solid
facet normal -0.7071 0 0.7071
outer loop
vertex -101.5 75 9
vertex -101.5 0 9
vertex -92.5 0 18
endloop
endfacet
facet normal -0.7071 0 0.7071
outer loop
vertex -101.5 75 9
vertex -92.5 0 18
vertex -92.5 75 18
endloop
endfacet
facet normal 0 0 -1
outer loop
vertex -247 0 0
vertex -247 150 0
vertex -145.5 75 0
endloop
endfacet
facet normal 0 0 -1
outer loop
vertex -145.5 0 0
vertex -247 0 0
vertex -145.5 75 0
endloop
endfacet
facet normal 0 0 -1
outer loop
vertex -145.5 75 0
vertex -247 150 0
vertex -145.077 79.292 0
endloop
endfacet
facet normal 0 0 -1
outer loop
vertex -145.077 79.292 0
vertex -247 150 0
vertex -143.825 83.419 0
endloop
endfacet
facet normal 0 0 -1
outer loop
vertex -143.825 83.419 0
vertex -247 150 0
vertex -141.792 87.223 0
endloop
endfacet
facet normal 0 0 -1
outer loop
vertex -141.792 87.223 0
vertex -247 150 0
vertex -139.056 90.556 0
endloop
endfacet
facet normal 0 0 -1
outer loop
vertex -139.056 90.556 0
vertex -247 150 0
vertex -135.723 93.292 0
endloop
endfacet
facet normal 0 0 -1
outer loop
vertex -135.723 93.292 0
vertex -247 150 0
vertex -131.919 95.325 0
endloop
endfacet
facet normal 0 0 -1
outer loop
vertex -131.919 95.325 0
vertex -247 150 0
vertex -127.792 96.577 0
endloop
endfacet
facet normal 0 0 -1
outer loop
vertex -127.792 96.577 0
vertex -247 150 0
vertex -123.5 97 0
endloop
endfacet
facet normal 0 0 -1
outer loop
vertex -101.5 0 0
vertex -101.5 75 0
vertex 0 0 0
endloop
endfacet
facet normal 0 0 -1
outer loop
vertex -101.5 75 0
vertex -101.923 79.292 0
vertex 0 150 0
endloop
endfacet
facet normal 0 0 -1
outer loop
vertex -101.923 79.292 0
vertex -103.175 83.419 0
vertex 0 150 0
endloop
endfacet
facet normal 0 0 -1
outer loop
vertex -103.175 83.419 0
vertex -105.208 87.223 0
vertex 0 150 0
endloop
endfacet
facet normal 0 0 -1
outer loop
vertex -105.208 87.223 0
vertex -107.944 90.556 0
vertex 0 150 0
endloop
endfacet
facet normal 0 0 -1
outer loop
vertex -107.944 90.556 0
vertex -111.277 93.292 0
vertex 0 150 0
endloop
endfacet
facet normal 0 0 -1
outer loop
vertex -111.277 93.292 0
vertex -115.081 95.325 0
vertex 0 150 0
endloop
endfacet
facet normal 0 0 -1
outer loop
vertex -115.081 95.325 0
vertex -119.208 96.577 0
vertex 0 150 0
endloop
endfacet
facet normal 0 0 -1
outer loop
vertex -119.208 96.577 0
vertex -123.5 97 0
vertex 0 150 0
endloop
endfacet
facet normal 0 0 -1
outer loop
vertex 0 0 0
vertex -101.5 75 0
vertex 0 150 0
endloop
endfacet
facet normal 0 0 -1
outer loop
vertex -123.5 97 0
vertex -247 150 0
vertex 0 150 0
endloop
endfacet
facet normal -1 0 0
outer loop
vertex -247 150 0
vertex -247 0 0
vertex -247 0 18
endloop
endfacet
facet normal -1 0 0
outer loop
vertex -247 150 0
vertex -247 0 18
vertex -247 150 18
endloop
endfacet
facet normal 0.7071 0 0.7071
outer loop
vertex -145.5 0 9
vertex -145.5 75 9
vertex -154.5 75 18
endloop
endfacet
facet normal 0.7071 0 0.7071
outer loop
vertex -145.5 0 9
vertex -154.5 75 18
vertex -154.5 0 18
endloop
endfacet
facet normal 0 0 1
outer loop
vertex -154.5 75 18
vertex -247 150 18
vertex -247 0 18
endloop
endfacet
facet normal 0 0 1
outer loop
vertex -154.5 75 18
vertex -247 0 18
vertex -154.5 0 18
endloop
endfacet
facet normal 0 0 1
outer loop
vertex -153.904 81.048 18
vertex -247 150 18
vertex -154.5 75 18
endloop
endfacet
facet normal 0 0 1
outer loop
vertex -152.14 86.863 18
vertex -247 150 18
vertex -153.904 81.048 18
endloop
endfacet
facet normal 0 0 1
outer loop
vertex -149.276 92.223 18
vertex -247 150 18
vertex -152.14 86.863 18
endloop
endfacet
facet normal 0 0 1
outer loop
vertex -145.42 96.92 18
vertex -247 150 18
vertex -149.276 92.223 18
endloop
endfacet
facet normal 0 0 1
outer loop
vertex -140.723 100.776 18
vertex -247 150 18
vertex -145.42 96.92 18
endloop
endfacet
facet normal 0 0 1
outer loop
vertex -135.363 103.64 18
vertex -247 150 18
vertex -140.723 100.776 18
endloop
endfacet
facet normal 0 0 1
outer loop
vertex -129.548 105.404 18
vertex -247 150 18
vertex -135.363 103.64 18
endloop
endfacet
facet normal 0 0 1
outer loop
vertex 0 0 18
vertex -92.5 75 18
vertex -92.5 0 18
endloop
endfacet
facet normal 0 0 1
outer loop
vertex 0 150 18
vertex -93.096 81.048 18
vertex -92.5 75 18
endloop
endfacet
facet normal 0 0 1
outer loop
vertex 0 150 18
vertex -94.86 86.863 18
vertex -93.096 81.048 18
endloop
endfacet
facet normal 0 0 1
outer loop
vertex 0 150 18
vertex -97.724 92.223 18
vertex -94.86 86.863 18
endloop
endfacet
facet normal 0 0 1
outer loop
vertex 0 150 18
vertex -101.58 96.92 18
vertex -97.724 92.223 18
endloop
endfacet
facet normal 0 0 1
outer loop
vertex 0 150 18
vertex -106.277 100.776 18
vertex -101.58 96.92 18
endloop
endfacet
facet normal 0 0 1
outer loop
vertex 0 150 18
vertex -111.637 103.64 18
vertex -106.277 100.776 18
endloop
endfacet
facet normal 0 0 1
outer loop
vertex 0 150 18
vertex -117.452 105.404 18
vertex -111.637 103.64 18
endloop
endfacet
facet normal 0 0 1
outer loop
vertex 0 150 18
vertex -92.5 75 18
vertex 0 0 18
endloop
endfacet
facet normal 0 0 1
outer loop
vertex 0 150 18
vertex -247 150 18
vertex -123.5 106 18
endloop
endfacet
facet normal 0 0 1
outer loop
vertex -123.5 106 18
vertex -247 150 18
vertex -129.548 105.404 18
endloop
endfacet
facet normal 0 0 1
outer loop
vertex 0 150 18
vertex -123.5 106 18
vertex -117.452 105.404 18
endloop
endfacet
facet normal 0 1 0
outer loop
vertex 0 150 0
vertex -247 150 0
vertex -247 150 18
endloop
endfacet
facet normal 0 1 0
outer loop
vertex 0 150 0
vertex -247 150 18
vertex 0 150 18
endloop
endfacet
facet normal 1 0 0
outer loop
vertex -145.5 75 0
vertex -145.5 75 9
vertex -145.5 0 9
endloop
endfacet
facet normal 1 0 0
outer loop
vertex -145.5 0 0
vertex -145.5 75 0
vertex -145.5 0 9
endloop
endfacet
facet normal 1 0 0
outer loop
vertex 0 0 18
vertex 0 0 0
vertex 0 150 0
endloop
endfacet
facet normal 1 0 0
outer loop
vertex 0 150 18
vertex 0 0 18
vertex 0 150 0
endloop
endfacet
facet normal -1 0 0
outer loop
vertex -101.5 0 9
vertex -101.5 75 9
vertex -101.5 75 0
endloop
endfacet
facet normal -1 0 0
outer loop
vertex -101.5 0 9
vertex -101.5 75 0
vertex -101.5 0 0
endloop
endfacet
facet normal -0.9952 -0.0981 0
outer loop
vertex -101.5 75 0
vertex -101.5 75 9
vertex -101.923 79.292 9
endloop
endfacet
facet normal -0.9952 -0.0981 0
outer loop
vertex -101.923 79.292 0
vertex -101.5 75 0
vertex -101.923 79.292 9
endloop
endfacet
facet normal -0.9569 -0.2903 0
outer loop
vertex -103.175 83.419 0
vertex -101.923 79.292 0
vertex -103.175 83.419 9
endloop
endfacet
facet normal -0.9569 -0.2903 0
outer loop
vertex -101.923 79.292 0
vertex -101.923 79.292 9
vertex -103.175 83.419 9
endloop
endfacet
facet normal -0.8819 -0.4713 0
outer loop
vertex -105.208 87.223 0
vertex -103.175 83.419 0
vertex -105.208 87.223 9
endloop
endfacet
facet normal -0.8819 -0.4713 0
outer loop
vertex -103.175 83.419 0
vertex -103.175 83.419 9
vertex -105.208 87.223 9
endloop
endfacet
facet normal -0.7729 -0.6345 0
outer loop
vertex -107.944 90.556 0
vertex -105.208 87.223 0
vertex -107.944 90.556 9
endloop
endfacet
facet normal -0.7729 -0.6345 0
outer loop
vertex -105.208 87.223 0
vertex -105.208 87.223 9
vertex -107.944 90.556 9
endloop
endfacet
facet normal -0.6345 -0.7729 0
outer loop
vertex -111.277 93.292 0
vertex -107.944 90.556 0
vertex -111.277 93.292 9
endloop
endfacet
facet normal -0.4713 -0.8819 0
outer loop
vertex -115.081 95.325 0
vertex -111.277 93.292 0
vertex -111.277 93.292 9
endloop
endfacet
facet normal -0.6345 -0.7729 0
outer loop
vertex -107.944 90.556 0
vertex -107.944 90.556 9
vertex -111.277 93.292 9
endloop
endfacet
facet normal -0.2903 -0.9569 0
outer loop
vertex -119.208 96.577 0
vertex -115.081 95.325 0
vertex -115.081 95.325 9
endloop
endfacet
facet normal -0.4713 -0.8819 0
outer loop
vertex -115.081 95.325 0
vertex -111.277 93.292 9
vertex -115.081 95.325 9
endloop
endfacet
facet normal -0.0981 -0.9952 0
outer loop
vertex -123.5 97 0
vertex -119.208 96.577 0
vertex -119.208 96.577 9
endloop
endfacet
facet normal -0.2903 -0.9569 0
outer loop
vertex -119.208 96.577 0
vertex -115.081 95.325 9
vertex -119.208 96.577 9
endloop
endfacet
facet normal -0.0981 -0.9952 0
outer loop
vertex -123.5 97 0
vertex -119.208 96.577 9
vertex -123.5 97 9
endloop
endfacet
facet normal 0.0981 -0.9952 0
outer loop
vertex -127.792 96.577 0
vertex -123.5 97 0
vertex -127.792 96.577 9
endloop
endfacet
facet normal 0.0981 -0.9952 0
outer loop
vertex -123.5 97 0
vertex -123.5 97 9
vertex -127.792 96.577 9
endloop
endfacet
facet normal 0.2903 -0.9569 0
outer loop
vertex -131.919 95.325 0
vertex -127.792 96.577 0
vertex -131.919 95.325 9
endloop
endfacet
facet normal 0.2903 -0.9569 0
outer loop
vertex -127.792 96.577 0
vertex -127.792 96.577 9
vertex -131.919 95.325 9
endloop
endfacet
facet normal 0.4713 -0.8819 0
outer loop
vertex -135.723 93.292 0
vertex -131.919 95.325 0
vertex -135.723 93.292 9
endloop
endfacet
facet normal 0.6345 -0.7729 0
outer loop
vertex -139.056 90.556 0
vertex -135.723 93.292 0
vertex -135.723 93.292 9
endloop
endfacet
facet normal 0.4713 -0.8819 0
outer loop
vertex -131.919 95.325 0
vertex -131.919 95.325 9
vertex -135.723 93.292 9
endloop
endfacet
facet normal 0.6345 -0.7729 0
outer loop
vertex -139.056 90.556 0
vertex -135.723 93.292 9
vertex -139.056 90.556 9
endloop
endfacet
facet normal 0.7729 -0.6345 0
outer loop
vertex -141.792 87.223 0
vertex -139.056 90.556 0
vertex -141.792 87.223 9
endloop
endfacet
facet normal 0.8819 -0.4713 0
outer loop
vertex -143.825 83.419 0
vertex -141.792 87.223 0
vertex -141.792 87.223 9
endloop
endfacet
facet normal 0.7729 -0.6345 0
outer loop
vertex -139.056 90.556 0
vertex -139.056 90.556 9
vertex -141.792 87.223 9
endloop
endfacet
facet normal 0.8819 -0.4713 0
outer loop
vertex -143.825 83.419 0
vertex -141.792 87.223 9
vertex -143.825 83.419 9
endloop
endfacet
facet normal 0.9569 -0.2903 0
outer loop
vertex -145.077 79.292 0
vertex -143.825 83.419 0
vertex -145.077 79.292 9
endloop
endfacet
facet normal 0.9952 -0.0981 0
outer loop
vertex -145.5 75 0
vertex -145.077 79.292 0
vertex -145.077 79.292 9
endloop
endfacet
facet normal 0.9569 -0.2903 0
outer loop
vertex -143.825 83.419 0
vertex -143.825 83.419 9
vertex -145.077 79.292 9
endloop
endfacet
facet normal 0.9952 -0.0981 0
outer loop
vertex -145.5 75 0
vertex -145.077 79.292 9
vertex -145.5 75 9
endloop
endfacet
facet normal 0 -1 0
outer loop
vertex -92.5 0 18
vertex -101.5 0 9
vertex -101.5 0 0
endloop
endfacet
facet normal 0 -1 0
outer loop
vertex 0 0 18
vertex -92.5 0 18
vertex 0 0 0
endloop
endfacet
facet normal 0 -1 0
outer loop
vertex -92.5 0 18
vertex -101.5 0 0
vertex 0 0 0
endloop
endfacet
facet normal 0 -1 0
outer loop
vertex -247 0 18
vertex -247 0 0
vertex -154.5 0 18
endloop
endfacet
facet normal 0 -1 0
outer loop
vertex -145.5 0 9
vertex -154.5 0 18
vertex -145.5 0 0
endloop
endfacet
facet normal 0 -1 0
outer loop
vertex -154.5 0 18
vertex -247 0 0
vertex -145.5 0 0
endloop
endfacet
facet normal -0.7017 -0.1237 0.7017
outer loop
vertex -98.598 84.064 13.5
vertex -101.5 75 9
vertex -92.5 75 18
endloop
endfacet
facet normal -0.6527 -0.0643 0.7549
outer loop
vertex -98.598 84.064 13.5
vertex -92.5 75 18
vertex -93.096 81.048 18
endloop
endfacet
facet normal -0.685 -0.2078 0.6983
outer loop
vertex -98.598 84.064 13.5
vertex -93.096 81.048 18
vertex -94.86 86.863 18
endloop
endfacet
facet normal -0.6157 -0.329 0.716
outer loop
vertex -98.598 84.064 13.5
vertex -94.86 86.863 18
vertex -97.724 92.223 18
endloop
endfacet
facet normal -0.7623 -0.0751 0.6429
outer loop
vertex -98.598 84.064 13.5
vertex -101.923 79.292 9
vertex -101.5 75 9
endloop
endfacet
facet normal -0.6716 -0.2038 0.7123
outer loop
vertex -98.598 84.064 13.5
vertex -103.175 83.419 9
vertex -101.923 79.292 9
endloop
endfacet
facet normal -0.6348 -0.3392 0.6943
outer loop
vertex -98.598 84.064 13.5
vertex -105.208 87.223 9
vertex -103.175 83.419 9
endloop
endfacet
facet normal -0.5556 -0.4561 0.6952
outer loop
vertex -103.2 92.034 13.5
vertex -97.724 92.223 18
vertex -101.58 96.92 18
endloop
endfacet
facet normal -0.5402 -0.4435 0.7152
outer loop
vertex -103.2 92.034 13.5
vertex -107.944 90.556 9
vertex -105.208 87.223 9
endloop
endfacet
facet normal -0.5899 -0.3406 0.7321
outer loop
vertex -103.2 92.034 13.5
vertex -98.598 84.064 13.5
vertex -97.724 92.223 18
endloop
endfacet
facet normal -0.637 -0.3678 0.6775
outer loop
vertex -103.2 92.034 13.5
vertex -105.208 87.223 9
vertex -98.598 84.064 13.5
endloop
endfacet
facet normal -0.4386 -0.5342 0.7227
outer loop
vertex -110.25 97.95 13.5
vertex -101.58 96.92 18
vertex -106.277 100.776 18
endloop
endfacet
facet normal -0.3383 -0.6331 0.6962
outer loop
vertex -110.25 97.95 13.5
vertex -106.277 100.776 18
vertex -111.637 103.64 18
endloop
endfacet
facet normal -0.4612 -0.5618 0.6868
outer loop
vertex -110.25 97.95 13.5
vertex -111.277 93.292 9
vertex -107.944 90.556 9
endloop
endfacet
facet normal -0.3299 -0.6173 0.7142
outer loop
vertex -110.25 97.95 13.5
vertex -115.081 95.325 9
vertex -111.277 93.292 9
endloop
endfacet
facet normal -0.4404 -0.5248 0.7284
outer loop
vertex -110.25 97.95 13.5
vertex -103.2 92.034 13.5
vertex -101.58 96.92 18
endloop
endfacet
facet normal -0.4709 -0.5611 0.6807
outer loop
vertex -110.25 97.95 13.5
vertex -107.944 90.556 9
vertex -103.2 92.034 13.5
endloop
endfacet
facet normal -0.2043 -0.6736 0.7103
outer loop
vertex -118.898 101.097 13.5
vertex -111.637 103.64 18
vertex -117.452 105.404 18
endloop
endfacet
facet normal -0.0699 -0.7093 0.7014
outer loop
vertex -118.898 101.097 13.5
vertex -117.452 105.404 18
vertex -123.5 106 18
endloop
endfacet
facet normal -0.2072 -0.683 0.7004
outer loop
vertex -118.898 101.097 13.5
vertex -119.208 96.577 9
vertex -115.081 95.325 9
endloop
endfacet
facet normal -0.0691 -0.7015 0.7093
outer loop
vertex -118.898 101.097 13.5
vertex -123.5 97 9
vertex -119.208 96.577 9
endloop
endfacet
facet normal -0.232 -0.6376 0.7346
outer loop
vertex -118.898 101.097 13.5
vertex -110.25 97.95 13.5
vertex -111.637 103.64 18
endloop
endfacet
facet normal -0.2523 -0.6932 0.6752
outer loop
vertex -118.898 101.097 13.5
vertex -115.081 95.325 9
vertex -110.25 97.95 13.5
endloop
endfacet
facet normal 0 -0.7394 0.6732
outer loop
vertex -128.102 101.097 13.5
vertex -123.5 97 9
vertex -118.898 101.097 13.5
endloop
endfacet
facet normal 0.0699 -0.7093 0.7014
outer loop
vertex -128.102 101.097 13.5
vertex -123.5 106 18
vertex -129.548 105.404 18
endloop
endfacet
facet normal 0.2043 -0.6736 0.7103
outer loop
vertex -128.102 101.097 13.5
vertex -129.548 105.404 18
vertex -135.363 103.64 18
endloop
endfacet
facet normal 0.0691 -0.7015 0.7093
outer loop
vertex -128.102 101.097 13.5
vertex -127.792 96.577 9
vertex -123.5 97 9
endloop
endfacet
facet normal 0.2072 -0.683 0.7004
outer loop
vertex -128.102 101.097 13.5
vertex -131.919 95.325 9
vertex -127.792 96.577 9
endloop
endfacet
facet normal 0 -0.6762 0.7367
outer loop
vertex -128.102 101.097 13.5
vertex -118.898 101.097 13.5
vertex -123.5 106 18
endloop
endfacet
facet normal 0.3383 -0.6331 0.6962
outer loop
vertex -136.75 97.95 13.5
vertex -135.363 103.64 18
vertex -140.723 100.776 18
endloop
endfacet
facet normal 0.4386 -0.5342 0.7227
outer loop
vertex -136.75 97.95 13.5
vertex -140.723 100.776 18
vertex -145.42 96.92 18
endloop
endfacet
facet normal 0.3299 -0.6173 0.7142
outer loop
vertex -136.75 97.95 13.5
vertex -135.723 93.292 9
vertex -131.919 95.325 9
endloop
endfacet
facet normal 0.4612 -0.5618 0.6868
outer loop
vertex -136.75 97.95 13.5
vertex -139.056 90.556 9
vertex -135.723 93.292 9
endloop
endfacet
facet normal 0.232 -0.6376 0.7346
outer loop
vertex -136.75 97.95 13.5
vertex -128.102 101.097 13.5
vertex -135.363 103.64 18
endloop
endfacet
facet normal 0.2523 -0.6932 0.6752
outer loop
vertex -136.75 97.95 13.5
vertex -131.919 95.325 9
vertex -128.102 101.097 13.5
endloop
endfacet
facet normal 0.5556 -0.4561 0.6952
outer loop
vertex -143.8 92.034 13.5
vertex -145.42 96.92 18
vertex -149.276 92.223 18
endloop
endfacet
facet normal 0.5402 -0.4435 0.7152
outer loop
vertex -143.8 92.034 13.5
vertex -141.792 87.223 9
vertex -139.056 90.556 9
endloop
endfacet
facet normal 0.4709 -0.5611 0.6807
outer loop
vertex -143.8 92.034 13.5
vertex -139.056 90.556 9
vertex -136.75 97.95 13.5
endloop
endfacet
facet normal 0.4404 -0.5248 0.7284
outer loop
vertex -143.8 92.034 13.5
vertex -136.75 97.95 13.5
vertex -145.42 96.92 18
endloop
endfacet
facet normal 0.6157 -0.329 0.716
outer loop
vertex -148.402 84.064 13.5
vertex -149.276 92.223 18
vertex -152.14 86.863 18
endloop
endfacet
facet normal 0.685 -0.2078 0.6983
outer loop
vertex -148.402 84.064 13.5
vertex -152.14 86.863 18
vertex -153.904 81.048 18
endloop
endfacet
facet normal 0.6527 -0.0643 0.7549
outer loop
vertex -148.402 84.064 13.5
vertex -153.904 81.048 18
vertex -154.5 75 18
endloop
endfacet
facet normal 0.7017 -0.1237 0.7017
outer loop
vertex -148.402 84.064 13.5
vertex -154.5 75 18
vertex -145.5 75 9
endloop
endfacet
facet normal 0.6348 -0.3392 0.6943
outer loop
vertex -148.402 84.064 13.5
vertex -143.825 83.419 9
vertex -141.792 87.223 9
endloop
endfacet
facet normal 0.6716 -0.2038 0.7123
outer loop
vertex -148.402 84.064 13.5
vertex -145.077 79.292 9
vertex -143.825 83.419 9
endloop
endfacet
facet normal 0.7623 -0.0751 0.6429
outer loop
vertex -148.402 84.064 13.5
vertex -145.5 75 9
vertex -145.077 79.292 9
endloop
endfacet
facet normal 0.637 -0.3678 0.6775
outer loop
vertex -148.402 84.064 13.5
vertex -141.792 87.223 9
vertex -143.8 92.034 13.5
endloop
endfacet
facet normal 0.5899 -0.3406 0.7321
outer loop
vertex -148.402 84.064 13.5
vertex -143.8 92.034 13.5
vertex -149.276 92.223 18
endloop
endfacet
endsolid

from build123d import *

# Parameters (mm, degrees)
SKETCH_W     = 247
SKETCH_H     = 150
PAD_DEPTH    = 18
POCKET_DEPTH = 18.001
CHAMFER_SIZE = 9


with BuildPart() as part:
    # Sketch → Pad (new body)
    with BuildSketch(Plane.XY):
        with Locations((-123.5, 75)):
            Rectangle(SKETCH_W, SKETCH_H)
    extrude(amount=PAD_DEPTH)

    # Sketch001 (on Face6 of Pad) → Pocket (cut, through all)
    with BuildSketch(Plane.XY.offset(18)):
        with BuildLine():
            ThreePointArc((-101.5, 75), (-123.5, 97), (-145.5, 75))
            Line((-145.5, 75), (-145.5, 0))
            Line((-101.5, 0), (-145.5, 0))
            Line((-101.5, 75), (-101.5, 0))
        make_face()
    extrude(amount=-POCKET_DEPTH, mode=Mode.SUBTRACT)

    # Chamfer
    chamfer_edges = [part.edges().sort_by_distance(p)[0] for p in [
        (-145.5, 37.5, 18),
        (-123.5, 97, 18),
        (-101.5, 37.5, 18),
    ]]
    chamfer(chamfer_edges, length=CHAMFER_SIZE)


solid = part.part
